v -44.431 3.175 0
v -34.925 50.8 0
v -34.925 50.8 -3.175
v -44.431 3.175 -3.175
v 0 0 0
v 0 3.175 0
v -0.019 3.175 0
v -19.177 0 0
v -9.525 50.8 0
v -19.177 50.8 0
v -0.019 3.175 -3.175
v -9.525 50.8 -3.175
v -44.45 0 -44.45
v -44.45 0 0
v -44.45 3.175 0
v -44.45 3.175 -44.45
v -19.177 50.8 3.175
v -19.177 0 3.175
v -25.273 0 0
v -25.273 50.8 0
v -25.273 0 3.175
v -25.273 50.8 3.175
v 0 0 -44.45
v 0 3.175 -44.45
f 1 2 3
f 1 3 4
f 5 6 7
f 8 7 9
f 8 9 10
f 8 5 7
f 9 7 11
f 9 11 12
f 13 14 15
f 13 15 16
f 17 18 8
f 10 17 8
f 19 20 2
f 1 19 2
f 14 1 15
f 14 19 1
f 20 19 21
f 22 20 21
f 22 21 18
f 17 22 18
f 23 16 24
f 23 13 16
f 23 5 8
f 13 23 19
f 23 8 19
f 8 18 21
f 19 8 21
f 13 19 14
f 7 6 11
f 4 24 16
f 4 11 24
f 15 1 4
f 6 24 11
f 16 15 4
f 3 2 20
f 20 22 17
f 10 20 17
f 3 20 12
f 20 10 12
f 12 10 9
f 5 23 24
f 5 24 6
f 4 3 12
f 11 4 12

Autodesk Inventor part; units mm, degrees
ref_plane "YZ Plane" through (0, 0, 0) normal (1, 0, 0) x (0, 1, 0)
ref_plane "XZ Plane" through (0, 0, 0) normal (0, 1, 0) x (-1, 0, 0)
ref_plane "XY Plane" through (0, 0, 0) normal (0, 0, 1) x (1, 0, 0)
sketch "Sketch1" plane through (0, 0, 0) normal (0, 1, 0) x (-1, 0, 0)
  line L0 (0, 0) -> (44.45, 0)
  line L1 (44.45, 0) -> (44.45, -44.45)
  line L2 (44.45, -44.45) -> (0, -44.45)
  line L3 (0, -44.45) -> (0, 0)
  dimension "d0" = 44.45
  dimension "d1" = 44.45
extrude "Extrusion1" add sketch "Sketch1" along normal blind 3.175
sketch "Sketch2" plane through (-44.45, 0, 0) normal (0, 0, 1) x (1, 0, 0)
  line L0 (9.525, 50.8) -> (34.925, 50.8)
  line L1 (44.45, 0) -> (0, 0) projected
  line L2 (22.225, 50.8) -> (22.225, 54.352)
  line L3 (22.225, 0) -> (22.225, -5.76)
  line L4 (9.525, 50.8) -> (0.0188, 3.175)
  line L5 (0.0188, 3.175) -> (44.4312, 3.175)
  line L6 (44.4312, 3.175) -> (34.925, 50.8)
  line L7 (0, 3.175) -> (44.45, 3.175) projected
  dimension "d4" = 25.4
  dimension "d5" = 50.8
  dimension "d6" = 0
  dimension "d9" = 0
extrude "Extrusion2" add sketch "Sketch2" against normal blind 3.175
sketch "Sketch3" plane through (0, 0, 0) normal (0, -1, 0) x (1, 0, 0)
  line L0 (-25.273, 0) -> (-25.273, 3.175)
  line L1 (-19.177, 3.175) -> (-19.177, 0)
  line L2 (-19.177, 0) -> (-25.273, 0)
  line L3 (0, 0) -> (-44.45, 0) projected
  line L4 (-25.273, 3.175) -> (-19.177, 3.175)
  line L5 (0, -44.45) -> (0, 0) projected
  dimension "d10" = 3.175
  dimension "d13" = 6.096
  dimension "d14" = 19.177
extrude "Extrusion3" add sketch "Sketch3" against normal up to surface (50.8 mm away)
properties part number "Bottom Elevator Bracket"
